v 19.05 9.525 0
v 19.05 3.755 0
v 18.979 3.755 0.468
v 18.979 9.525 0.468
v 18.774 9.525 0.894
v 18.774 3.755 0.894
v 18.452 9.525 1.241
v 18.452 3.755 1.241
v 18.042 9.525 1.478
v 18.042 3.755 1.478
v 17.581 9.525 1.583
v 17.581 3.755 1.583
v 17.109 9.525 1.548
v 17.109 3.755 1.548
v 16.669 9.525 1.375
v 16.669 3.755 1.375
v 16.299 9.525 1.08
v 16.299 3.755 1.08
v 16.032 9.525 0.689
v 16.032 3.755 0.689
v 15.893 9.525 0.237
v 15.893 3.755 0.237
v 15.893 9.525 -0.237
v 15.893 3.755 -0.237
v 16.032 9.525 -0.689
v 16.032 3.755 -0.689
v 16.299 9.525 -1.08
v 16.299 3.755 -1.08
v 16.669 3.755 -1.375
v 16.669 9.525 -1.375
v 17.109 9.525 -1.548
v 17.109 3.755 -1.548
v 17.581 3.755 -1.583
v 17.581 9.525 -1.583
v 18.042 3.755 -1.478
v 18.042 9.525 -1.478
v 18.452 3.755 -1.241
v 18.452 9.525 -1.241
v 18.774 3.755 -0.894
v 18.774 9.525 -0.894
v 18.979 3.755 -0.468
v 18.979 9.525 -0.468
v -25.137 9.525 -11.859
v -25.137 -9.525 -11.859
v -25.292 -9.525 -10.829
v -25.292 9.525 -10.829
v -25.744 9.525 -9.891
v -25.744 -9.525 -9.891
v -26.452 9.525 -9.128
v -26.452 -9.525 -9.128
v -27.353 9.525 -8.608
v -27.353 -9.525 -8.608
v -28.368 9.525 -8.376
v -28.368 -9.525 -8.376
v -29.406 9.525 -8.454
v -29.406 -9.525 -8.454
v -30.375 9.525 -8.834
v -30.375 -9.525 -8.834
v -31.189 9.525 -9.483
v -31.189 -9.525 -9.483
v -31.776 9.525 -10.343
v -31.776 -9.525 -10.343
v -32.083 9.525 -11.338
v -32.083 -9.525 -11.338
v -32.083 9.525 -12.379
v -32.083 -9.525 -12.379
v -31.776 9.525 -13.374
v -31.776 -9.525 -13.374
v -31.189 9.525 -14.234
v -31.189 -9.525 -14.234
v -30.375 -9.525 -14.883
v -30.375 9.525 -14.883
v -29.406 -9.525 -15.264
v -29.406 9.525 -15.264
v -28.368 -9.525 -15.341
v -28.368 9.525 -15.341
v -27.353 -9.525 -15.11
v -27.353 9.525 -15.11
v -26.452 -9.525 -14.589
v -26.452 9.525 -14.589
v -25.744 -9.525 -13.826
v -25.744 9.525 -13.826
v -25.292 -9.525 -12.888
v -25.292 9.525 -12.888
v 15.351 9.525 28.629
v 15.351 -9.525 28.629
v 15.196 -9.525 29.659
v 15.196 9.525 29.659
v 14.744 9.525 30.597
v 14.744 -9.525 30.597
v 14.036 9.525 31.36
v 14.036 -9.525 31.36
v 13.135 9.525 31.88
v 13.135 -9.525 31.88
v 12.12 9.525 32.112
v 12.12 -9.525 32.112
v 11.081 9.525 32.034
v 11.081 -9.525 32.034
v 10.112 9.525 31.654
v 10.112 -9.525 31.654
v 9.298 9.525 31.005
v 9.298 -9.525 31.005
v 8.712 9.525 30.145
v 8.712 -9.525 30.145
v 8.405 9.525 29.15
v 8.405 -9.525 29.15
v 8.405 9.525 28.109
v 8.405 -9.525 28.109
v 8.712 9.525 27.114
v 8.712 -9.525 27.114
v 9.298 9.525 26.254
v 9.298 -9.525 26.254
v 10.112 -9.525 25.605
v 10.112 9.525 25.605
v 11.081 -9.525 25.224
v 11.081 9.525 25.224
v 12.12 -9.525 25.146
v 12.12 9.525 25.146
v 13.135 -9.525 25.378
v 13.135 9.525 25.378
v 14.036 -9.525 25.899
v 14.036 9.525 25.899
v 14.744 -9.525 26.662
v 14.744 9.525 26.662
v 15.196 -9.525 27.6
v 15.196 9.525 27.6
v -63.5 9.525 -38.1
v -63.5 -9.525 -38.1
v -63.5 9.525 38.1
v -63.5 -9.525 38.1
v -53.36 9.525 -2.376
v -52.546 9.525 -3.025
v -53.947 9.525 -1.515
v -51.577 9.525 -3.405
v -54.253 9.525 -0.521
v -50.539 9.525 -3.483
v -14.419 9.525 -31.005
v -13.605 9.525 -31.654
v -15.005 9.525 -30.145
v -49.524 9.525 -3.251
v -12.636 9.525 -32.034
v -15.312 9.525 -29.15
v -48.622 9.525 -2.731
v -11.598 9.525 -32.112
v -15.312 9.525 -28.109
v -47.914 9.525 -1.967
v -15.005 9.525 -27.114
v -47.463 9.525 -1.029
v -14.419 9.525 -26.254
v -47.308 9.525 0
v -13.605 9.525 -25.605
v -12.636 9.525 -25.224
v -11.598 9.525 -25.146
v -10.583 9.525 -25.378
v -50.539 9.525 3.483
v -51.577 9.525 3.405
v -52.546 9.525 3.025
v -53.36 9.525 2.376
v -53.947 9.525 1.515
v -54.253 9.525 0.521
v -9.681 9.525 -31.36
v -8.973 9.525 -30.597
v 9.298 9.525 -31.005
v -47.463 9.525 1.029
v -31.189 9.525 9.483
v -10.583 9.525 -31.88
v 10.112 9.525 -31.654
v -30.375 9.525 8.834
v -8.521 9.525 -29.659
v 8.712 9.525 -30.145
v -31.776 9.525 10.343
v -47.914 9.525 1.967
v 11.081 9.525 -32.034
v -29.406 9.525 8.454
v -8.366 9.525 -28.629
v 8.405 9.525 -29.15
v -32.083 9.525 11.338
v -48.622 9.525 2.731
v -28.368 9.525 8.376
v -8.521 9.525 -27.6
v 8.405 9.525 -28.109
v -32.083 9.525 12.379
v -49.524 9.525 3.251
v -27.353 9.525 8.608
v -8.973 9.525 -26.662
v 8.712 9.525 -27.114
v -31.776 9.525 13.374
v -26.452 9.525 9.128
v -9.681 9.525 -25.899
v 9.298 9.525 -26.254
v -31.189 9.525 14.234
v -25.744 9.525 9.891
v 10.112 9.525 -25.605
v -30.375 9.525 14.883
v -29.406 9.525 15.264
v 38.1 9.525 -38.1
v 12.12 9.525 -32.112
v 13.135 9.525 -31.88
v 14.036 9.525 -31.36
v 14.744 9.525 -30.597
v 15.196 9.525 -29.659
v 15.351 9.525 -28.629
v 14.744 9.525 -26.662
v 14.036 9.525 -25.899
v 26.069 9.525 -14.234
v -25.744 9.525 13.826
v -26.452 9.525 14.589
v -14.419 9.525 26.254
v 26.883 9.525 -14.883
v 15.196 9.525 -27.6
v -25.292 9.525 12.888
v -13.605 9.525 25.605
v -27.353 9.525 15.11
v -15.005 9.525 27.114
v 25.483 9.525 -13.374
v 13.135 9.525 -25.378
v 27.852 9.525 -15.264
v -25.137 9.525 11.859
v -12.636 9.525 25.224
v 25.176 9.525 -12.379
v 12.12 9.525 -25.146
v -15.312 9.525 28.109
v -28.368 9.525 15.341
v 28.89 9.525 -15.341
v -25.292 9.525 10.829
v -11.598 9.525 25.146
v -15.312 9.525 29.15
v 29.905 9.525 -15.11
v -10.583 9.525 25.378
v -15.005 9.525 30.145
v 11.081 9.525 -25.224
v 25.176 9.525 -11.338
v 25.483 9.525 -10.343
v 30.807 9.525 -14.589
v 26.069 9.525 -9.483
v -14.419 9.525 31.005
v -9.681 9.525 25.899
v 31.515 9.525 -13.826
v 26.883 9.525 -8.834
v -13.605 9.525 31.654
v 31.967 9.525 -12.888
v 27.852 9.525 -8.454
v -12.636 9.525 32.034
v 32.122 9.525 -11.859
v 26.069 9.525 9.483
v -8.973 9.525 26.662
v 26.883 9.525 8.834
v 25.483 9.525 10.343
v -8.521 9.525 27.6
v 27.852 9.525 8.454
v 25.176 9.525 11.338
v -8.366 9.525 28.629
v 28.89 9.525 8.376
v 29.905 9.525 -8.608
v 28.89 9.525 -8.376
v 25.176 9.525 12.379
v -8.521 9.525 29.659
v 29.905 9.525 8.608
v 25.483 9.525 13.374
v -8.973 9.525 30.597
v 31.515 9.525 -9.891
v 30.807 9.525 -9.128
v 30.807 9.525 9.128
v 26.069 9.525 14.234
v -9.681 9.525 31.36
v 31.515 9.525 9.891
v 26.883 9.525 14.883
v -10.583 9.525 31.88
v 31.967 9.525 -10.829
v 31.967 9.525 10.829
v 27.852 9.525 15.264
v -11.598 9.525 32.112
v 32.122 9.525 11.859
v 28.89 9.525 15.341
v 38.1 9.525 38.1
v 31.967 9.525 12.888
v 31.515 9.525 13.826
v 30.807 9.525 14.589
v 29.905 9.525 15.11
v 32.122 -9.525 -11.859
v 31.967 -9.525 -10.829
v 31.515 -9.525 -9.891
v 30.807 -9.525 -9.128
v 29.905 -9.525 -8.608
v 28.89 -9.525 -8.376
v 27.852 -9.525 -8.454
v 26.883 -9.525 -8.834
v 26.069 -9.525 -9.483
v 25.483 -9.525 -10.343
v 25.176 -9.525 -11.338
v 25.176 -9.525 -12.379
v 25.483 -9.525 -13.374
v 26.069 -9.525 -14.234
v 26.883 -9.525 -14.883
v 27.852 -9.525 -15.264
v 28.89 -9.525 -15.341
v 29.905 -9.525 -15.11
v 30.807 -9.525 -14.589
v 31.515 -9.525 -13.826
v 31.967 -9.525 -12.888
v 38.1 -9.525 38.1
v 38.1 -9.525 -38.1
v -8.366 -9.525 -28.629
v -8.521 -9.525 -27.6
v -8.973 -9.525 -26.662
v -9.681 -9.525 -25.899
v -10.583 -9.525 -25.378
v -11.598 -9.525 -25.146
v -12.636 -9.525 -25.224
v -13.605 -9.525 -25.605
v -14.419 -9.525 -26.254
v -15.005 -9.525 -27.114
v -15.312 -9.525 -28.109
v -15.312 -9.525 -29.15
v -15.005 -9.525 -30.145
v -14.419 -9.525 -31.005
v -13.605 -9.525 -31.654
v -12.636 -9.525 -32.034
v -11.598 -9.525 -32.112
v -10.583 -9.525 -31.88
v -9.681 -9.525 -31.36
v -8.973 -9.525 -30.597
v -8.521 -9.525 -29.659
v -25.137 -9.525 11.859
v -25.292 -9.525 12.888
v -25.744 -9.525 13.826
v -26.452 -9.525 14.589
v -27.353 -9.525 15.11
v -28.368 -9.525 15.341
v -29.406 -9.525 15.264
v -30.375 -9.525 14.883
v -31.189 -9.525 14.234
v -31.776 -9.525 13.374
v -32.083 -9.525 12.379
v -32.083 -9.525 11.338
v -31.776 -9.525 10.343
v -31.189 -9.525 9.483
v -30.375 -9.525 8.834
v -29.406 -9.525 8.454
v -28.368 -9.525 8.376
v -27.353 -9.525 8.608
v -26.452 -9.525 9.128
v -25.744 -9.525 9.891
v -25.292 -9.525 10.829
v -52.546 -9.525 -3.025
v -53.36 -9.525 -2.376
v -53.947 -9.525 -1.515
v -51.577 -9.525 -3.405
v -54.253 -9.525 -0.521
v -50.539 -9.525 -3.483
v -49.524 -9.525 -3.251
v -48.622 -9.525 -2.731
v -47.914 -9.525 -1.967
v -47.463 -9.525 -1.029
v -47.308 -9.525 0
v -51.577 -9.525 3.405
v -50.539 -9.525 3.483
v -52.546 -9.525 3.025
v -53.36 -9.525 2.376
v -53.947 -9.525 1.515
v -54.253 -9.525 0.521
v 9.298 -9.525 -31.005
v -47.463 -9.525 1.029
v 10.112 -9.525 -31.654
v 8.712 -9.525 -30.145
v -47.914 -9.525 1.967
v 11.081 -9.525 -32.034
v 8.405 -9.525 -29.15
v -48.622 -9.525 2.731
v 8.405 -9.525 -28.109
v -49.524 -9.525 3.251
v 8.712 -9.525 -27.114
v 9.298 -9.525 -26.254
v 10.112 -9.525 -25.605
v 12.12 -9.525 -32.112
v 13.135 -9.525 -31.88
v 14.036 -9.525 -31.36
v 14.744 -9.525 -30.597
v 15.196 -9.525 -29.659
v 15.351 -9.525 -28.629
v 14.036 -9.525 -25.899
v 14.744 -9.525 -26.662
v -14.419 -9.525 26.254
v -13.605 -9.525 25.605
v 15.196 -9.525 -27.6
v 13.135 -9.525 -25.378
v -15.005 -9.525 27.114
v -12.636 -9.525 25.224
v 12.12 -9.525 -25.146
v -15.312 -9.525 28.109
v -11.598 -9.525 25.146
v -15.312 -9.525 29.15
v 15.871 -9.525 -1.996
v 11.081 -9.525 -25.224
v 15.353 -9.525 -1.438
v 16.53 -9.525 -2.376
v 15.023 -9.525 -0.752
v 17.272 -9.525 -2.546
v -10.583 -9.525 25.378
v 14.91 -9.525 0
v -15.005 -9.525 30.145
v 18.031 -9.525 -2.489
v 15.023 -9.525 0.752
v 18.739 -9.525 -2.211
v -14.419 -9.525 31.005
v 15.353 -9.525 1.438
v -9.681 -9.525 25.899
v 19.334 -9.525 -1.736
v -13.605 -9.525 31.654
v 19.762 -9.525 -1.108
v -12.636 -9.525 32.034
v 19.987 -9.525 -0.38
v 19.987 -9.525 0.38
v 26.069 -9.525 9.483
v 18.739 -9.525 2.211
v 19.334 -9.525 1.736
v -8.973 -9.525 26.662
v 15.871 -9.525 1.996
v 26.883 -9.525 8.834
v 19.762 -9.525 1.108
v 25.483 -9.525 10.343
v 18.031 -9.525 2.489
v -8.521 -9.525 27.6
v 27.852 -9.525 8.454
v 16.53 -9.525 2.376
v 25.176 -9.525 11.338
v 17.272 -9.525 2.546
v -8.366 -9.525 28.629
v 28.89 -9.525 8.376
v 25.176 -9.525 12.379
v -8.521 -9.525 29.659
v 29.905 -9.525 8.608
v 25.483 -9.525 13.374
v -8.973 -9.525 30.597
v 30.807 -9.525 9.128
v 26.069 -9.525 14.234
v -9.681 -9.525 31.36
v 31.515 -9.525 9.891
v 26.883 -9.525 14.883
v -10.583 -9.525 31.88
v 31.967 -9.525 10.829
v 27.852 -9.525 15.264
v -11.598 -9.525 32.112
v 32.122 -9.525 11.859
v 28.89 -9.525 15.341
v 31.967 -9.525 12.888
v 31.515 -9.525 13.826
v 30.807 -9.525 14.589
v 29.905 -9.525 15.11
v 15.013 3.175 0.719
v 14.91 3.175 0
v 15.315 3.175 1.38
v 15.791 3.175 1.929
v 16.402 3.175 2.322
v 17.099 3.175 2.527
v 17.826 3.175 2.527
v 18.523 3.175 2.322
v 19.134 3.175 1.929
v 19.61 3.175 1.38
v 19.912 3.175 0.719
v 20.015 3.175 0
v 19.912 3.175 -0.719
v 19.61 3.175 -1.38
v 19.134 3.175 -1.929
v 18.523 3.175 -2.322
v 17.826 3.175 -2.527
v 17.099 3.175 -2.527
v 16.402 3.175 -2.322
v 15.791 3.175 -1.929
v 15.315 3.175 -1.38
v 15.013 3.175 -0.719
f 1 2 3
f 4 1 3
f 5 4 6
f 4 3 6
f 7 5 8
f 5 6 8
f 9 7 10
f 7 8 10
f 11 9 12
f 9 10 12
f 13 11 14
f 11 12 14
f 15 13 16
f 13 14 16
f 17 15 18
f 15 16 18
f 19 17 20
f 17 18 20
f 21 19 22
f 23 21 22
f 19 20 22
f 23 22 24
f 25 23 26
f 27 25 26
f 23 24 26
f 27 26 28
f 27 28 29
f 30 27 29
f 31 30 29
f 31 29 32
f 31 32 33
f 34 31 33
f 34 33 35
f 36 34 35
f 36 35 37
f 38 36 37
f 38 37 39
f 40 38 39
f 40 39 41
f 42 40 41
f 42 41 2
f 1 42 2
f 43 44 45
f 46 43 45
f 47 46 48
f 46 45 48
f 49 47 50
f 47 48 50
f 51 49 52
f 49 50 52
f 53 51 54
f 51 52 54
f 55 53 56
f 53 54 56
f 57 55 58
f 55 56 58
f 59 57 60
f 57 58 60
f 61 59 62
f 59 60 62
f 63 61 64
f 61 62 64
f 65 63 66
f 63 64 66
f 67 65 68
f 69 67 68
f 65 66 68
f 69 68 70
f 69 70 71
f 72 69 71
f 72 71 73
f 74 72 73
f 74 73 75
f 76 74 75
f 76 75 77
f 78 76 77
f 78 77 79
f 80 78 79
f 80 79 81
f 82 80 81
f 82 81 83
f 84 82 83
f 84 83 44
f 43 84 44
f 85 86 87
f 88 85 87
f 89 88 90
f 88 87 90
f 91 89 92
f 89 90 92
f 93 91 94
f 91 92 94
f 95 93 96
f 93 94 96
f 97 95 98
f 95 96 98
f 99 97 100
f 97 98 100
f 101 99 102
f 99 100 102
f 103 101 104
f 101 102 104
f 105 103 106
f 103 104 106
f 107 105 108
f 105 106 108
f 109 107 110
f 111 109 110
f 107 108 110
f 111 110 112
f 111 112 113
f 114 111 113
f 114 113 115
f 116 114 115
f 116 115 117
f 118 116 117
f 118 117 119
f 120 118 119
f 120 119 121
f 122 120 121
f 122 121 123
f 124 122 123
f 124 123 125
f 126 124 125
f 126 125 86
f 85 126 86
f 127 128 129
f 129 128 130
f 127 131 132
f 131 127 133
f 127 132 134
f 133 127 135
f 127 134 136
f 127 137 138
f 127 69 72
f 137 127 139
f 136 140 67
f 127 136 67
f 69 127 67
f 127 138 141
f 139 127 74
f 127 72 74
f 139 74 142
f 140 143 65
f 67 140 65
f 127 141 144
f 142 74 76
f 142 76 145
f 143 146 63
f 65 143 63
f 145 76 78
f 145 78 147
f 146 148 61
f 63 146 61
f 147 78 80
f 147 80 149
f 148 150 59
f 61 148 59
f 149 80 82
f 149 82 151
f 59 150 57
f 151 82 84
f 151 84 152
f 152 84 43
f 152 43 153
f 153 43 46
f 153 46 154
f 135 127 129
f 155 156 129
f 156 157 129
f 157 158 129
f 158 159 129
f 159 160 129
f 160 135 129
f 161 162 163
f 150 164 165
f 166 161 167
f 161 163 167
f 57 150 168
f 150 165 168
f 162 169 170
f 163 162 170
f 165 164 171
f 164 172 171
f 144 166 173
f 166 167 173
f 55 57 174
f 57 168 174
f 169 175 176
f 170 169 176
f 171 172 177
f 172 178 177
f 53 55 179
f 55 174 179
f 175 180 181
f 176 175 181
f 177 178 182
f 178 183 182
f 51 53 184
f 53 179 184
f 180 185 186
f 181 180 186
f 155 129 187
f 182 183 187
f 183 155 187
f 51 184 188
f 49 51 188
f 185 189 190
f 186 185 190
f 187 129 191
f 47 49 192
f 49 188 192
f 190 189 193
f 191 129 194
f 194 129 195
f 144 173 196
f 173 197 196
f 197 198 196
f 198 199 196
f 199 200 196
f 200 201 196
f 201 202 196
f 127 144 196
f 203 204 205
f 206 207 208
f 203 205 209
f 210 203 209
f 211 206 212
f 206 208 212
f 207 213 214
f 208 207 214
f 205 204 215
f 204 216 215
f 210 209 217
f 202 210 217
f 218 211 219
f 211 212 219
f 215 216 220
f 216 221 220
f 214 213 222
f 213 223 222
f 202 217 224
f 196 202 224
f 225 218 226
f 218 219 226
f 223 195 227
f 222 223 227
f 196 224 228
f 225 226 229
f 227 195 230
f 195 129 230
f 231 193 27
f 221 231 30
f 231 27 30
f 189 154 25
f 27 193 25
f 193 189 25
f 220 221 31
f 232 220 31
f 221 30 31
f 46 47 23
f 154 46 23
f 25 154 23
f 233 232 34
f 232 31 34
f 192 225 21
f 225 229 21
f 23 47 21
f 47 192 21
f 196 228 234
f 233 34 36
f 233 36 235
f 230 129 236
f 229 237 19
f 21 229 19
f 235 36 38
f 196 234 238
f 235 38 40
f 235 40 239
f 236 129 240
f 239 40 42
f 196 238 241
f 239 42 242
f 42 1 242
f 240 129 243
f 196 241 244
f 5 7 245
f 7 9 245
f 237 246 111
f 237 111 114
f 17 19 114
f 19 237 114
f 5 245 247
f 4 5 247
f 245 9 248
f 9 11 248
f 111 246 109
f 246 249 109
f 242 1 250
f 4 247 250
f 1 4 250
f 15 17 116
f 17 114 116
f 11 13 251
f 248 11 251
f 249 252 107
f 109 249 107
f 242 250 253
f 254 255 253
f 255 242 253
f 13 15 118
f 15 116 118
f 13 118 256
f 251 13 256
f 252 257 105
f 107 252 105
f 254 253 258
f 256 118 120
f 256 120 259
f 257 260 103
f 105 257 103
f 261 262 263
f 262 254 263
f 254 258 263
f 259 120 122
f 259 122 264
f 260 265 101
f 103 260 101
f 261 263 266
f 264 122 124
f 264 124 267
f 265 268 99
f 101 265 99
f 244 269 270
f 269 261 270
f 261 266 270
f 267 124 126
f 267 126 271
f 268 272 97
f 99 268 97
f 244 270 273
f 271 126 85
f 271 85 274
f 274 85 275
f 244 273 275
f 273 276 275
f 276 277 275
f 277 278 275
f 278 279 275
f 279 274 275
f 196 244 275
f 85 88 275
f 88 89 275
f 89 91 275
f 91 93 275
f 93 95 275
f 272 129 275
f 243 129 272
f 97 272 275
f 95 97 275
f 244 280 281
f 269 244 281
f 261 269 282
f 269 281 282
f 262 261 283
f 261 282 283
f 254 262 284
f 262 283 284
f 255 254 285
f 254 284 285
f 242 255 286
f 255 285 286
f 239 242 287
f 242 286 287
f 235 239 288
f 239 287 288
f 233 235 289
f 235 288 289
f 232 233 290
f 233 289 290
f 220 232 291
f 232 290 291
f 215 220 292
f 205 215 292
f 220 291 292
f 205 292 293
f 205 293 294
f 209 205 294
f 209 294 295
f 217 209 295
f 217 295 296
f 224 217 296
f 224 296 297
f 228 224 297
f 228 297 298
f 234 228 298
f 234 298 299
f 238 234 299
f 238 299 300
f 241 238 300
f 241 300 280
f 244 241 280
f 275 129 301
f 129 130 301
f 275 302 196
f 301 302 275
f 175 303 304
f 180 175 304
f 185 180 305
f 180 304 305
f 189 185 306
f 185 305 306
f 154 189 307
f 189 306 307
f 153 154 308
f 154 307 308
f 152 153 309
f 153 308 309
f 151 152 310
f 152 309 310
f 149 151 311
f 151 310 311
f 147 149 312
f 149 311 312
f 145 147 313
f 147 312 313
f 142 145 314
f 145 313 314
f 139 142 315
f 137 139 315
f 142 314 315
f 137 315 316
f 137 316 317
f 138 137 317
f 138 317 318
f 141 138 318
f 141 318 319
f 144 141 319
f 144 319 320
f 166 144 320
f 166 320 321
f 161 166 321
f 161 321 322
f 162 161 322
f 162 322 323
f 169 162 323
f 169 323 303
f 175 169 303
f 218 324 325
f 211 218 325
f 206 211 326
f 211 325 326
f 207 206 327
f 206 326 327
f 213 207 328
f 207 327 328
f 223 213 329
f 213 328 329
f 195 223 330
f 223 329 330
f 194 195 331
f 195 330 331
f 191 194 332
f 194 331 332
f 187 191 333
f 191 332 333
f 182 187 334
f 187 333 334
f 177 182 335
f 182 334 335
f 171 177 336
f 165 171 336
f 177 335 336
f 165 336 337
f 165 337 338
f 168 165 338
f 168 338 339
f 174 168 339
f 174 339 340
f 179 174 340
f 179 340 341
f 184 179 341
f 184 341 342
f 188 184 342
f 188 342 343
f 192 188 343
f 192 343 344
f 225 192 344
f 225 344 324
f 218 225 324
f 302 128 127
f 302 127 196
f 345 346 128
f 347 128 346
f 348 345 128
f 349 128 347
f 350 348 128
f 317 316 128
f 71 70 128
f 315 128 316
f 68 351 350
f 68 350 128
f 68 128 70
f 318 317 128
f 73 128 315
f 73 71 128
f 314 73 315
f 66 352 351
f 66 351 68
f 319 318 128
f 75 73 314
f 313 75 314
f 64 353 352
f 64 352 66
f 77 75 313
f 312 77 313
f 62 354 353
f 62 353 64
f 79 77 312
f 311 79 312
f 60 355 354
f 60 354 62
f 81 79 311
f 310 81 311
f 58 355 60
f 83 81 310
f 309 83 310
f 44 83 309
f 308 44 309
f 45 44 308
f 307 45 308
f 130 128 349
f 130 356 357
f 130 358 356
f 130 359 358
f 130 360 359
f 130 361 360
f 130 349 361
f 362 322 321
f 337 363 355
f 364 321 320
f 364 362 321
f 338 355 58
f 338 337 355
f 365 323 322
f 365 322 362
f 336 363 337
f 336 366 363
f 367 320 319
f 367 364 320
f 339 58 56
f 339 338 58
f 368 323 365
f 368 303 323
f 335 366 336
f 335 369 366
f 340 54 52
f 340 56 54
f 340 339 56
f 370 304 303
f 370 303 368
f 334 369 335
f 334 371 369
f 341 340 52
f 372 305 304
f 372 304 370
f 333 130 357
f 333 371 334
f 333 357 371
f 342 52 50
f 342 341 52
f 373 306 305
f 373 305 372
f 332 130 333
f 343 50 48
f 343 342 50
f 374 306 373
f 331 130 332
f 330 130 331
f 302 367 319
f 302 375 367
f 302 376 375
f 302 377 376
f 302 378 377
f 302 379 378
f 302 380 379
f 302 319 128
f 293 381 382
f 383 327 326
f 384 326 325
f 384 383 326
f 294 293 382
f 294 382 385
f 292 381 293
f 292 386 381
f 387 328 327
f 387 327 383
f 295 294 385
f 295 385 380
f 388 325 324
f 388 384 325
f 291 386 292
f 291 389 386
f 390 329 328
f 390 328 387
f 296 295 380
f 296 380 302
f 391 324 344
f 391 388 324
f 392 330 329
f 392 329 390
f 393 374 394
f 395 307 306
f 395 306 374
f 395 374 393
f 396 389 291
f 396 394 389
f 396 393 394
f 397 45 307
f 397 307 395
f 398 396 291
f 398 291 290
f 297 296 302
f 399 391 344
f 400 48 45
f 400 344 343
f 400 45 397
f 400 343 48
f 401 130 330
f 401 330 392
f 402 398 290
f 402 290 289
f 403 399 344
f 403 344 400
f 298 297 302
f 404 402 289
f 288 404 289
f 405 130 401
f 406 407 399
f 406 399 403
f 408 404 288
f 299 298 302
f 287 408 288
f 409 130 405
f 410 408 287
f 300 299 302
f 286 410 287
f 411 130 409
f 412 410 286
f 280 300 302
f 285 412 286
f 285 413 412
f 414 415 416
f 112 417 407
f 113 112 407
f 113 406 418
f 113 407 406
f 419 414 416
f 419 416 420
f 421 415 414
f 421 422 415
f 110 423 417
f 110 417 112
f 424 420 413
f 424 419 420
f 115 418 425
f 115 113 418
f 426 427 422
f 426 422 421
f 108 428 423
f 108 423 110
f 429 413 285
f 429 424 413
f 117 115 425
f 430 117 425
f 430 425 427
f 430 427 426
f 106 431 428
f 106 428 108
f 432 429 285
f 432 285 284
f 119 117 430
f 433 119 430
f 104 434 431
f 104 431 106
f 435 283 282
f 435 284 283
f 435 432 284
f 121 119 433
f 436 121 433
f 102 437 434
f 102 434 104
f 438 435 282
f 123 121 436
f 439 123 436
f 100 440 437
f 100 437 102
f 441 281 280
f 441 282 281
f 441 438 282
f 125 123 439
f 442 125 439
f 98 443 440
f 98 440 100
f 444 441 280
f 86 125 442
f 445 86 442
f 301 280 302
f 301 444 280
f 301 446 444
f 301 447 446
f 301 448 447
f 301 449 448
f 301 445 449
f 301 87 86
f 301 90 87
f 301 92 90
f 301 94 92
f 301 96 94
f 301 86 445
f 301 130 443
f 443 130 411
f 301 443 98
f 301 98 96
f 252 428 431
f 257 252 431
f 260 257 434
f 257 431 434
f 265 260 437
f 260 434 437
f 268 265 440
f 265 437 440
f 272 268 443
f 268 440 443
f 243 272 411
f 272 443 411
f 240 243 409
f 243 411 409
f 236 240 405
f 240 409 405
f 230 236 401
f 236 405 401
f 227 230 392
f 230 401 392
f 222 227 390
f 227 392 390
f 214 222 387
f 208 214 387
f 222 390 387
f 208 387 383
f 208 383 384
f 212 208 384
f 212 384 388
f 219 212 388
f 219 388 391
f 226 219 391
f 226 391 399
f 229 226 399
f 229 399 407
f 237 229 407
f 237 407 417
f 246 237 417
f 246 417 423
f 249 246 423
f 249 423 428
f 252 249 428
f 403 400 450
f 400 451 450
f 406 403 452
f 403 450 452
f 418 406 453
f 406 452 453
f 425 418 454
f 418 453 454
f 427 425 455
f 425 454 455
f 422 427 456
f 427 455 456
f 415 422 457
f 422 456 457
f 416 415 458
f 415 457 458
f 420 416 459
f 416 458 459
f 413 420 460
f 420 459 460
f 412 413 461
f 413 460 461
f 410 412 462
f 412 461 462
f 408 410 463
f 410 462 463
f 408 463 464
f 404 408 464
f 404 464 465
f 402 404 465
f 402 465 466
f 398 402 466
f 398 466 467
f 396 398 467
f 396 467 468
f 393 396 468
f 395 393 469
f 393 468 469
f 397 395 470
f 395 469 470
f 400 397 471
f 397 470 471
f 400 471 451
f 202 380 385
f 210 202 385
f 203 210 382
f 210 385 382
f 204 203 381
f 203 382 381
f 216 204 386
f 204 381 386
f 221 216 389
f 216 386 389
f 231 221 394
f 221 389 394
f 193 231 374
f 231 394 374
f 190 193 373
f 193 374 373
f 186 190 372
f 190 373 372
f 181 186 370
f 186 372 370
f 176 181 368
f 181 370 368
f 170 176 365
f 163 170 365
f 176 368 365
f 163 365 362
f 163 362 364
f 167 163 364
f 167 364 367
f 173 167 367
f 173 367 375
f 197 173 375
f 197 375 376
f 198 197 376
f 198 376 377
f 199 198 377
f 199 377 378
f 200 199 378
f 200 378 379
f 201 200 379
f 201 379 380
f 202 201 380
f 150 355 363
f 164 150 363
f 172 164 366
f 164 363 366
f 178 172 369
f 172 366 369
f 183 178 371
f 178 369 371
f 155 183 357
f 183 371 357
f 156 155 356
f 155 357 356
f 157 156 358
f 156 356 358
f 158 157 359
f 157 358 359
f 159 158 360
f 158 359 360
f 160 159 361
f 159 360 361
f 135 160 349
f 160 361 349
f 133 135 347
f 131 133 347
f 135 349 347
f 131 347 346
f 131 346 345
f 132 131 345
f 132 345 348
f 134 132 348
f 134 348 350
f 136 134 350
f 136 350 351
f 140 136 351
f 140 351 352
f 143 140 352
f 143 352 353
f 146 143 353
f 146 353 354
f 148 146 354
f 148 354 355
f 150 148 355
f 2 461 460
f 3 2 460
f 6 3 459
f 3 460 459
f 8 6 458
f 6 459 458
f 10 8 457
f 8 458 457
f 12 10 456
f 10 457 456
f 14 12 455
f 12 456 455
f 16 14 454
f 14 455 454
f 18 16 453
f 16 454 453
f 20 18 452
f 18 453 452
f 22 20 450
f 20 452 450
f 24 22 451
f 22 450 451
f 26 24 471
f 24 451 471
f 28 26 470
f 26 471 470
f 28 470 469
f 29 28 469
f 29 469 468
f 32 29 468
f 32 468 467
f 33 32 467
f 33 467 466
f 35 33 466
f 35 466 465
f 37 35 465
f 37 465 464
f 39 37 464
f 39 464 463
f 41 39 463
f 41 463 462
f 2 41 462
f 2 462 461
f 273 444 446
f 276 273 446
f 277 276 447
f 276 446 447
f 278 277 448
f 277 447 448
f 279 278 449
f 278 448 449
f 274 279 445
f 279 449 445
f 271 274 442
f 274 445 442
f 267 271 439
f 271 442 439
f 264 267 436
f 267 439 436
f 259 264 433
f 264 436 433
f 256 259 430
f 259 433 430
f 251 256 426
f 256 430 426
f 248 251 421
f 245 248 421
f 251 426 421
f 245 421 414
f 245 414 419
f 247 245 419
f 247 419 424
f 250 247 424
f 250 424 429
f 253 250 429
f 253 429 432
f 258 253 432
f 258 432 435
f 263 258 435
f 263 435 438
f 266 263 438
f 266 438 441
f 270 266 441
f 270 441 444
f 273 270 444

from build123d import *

# Parameters (mm, degrees)
F0_W     = 101.6
F0_H     = 76.2
F1_DEPTH = 9.525
F2_R     = 3.4925
F3_DEPTH = 25.4
F4_R     = 3.4925
F5_DEPTH = 25.4
F6_R     = 1.5875
F7_DEPTH = 25.4
F9_D     = 5.1054
F9_DEPTH = 12.7
F9_TIP   = 1.5338169022


with BuildPart() as f1:
    # F0 (on Front) → F1 (new body, symmetric)
    with BuildSketch(Plane.XZ):
        with Locations((-12.7, 0)):
            Rectangle(F0_W, F0_H)
    extrude(amount=F1_DEPTH, both=True)

    # F2 (on face) → F3 (cut)
    with BuildSketch(Plane.XZ.offset(9.525)):
        with Locations((11.8585942021, 28.6291789535)):
            Circle(F2_R)
        with Locations((-11.8585942021, 28.6291789535)):
            Circle(F2_R)
        with Locations((-28.6291789535, 11.8585942021)):
            Circle(F2_R)
        with Locations((-28.6291789535, -11.8585942021)):
            Circle(F2_R)
        with Locations((-11.8585942021, -28.6291789535)):
            Circle(F2_R)
        with Locations((11.8585942021, -28.6291789535)):
            Circle(F2_R)
        with Locations((28.6291789535, -11.8585942021)):
            Circle(F2_R)
        with Locations((28.6291789535, 11.8585942021)):
            Circle(F2_R)
    extrude(amount=-F3_DEPTH, mode=Mode.SUBTRACT)

    # F4 (on face) → F5 (cut)
    with BuildSketch(Plane.XZ.offset(9.525)):
        with Locations((-50.8, 0)):
            Circle(F4_R)
    extrude(amount=-F5_DEPTH, mode=Mode.SUBTRACT)

    # F6 (on face) → F7 (cut)
    with BuildSketch(Plane.XZ.offset(9.525)):
        with Locations((17.4625, 0)):
            Circle(F6_R)
    extrude(amount=-F7_DEPTH, mode=Mode.SUBTRACT)

    # F9
    with Locations(Plane.XZ.offset(9.525)):
        with Locations((17.4625, 0)):
            Hole(F9_D / 2, depth=F9_DEPTH)
            with Locations((0, 0, -(F9_DEPTH + F9_TIP / 2))):  # 118° drill point
                Cone(0, F9_D / 2, F9_TIP, mode=Mode.SUBTRACT)


solid = f1.part
